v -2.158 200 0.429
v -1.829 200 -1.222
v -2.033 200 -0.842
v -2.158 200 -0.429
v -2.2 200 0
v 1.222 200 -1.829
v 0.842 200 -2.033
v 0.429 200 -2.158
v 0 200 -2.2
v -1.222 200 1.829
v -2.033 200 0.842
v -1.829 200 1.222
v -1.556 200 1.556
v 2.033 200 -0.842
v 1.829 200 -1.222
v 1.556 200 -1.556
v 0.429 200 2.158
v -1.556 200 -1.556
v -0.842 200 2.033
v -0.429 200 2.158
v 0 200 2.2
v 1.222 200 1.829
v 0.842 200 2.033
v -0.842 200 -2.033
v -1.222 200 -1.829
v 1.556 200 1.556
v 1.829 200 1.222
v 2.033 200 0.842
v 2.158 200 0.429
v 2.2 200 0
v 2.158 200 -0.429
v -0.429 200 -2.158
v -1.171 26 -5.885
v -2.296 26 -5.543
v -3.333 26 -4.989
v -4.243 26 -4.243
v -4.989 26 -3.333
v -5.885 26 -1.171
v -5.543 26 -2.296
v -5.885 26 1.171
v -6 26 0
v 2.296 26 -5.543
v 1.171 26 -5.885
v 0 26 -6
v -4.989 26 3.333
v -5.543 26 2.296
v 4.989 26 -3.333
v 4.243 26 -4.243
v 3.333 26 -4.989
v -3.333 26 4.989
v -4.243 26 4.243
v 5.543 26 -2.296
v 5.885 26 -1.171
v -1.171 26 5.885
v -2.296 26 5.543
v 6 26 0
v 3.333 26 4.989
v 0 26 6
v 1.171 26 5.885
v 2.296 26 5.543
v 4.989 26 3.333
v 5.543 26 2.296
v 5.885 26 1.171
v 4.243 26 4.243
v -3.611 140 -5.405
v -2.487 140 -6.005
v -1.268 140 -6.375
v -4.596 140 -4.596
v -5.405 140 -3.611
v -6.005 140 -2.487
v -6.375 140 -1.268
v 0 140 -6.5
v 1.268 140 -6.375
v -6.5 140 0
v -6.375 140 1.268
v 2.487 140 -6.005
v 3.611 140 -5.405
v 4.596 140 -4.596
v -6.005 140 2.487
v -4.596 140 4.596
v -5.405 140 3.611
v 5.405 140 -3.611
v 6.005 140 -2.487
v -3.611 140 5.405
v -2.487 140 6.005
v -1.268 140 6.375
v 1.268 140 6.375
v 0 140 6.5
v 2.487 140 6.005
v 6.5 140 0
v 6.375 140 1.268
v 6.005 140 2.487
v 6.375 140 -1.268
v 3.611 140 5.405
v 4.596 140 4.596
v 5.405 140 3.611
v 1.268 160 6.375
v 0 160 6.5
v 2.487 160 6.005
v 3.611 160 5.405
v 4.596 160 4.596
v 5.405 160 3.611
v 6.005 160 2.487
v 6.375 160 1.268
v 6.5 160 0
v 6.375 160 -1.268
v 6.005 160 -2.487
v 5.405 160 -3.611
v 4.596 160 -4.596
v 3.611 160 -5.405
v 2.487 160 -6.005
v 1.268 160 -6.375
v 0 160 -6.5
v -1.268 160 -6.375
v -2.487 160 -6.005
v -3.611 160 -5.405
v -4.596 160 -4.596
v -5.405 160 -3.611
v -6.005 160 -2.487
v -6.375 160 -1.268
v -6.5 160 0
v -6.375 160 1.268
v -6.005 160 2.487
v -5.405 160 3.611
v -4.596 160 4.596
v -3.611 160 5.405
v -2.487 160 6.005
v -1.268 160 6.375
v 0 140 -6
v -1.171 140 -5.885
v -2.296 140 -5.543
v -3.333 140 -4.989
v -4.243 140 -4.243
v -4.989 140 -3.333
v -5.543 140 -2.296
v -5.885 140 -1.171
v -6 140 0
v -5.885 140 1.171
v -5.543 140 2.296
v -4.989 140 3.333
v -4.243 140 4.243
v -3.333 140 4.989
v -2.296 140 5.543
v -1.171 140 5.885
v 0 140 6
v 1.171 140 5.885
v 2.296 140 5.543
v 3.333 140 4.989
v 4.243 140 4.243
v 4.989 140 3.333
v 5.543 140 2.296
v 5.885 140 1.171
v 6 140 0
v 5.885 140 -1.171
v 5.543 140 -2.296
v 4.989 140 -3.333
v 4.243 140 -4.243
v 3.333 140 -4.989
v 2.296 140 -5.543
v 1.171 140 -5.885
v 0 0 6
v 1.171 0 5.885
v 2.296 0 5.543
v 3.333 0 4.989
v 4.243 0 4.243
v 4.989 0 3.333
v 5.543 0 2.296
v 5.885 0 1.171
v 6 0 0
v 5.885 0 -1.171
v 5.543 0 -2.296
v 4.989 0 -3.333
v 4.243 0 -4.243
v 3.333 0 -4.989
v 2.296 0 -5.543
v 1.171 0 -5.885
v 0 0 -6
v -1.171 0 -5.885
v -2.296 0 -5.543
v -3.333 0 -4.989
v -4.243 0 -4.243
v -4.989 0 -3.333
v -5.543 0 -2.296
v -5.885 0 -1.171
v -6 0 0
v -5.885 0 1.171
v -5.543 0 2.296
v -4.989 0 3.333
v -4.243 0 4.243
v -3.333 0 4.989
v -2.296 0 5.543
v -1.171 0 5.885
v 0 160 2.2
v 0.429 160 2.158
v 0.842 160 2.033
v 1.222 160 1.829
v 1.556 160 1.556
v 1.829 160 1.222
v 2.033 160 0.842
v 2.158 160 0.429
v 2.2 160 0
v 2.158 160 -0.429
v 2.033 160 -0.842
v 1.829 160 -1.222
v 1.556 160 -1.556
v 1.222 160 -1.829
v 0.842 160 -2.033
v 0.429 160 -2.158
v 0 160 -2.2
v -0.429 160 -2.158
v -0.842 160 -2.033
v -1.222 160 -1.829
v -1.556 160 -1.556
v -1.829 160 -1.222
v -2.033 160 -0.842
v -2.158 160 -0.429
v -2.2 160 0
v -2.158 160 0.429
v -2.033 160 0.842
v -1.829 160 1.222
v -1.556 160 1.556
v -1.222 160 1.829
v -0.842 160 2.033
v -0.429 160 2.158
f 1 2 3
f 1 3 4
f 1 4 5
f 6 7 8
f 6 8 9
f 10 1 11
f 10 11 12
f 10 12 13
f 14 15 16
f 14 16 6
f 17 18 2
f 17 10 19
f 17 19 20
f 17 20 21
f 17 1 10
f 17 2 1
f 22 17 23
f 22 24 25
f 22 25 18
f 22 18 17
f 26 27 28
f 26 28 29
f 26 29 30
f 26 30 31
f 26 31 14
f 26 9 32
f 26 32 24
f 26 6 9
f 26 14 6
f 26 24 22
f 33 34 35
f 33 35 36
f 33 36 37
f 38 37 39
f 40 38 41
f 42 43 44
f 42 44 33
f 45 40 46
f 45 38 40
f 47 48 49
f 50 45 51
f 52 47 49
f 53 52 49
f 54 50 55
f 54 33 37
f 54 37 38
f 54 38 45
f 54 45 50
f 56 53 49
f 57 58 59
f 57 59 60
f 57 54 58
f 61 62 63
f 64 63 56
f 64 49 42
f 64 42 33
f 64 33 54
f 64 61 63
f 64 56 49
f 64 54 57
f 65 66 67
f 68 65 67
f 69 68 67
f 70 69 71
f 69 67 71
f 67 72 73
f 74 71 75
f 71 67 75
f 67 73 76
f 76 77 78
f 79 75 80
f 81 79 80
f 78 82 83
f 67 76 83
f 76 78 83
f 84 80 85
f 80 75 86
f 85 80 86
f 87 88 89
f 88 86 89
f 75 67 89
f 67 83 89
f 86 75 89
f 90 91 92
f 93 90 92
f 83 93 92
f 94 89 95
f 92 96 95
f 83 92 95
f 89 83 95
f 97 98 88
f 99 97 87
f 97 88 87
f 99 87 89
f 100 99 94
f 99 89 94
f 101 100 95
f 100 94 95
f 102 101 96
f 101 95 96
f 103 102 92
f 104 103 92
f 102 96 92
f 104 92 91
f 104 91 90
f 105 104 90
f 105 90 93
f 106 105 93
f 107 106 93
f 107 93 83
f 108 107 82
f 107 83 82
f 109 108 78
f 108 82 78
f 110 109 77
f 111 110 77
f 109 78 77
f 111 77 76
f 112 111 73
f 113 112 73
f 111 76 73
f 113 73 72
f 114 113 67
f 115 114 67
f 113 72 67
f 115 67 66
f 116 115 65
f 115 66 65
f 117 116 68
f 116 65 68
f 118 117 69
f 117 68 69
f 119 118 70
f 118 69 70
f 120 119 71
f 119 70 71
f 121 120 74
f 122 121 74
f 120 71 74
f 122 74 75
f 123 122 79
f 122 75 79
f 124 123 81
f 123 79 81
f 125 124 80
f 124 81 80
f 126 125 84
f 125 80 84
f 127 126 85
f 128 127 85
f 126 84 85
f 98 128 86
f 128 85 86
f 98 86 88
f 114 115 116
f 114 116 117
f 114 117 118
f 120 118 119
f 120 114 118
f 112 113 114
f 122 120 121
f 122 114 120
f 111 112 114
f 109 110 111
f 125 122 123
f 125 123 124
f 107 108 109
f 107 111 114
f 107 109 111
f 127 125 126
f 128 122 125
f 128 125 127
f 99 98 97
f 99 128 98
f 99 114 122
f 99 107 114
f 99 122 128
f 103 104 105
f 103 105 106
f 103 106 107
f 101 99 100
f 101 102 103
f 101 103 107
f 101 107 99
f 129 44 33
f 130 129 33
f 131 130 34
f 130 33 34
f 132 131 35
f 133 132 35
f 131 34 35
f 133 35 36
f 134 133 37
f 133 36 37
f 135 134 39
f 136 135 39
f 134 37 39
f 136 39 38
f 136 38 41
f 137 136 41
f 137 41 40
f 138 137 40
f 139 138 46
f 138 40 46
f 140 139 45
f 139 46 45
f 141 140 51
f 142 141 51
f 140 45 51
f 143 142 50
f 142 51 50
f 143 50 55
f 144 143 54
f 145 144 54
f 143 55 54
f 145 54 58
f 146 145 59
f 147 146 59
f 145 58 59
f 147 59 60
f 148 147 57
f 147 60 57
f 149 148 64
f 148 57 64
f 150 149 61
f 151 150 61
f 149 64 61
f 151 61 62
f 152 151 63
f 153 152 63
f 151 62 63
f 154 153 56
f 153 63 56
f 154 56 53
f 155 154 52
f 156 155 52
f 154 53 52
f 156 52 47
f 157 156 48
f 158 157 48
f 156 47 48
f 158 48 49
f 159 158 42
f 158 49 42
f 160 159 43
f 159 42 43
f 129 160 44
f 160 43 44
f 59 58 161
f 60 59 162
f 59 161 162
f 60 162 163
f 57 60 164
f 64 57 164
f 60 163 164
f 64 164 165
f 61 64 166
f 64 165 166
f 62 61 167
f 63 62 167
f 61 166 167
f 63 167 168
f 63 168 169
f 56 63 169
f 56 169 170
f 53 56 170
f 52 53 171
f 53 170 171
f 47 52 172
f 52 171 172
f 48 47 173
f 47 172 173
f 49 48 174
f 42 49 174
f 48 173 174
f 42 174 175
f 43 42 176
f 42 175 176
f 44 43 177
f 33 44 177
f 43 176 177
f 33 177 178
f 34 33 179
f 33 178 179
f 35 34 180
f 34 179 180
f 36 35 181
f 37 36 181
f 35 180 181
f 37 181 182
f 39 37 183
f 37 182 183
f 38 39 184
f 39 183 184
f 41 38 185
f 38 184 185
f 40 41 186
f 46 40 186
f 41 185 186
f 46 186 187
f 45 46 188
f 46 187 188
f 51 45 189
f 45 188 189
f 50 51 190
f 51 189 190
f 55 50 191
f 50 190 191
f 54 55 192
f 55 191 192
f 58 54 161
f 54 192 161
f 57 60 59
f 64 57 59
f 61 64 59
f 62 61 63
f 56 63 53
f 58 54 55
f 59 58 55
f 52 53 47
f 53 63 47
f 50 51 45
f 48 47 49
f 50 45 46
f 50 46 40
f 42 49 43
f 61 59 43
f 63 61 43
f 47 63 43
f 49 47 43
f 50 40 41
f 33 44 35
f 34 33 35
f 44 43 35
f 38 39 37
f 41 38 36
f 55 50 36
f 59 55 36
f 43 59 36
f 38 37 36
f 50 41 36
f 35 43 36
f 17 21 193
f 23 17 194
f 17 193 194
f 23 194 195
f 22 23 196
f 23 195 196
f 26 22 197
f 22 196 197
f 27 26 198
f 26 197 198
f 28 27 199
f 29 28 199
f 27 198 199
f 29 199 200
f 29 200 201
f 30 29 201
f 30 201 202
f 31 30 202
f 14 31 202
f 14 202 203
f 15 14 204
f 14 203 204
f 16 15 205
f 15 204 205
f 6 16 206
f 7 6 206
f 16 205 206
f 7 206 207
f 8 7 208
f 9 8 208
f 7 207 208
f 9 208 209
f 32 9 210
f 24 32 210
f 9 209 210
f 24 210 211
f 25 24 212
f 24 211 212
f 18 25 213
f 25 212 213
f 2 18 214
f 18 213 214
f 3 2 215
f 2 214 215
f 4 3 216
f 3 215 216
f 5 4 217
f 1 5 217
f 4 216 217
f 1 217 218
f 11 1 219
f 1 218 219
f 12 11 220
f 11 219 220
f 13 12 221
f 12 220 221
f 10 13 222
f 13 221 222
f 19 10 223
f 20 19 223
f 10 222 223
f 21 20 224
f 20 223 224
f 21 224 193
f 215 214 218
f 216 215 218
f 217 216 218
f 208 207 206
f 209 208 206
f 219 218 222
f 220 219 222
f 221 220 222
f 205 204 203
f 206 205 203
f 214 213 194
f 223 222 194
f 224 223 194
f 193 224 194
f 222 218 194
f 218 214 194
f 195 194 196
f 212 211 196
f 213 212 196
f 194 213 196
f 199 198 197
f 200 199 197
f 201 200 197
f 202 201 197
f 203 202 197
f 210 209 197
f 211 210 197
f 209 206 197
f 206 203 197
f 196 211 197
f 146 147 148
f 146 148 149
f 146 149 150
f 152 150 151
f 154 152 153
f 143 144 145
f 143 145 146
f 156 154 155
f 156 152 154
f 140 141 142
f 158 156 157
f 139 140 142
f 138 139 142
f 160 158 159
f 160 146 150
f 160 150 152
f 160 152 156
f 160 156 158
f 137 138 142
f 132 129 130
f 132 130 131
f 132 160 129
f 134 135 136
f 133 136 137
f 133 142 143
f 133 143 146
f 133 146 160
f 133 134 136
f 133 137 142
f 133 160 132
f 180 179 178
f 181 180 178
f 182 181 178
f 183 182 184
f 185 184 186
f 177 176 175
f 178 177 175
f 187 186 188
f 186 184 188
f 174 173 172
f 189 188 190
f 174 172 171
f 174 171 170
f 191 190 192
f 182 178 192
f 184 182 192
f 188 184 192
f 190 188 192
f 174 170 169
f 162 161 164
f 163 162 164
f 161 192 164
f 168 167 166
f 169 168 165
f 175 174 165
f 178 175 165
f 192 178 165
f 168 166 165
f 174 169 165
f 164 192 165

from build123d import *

# Parameters (mm, degrees)
SK_BULB_GUARD_R      = 6
BULB_GUARD_DEPTH     = 26
ELECTRODE_START      = 26
SK_ELECTRODE_BODY_R  = 6
ELECTRODE_BODY_DEPTH = 114
ELECTRODE_START_2    = 140
SK_ELECTRODE_CAP_R   = 6.5
ELECTRODE_CAP_DEPTH  = 20
CABLE_START          = 160
SK_CABLE_R           = 2.2
CABLE_DEPTH          = 40


with BuildPart() as part:
    # SK Bulb guard → Bulb guard (new body)
    with BuildSketch(Plane(origin=(0, 0, 0), x_dir=(1, 0, 0), z_dir=(0, 1, 0))):
        with Locations(Location((0, 0, 0), (0, 0, 270))):
            Circle(SK_BULB_GUARD_R)
    extrude(amount=BULB_GUARD_DEPTH)


with BuildPart() as body_2:
    # SK Electrode body → Electrode body (new body)
    with BuildSketch(Plane(origin=(0, 0, 0), x_dir=(1, 0, 0), z_dir=(0, 1, 0)).offset(ELECTRODE_START)):
        with Locations(Location((0, 0, 0), (0, 0, 90))):
            Circle(SK_ELECTRODE_BODY_R)
    extrude(amount=ELECTRODE_BODY_DEPTH)


with BuildPart() as body_3:
    # SK Electrode cap → Electrode cap (new body)
    with BuildSketch(Plane(origin=(0, 0, 0), x_dir=(1, 0, 0), z_dir=(0, 1, 0)).offset(ELECTRODE_START_2)):
        with Locations(Location((0, 0, 0), (0, 0, 270))):
            Circle(SK_ELECTRODE_CAP_R)
    extrude(amount=ELECTRODE_CAP_DEPTH)


with BuildPart() as body_4:
    # SK Cable → Cable (new body)
    with BuildSketch(Plane(origin=(0, 0, 0), x_dir=(1, 0, 0), z_dir=(0, 1, 0)).offset(CABLE_START)):
        with Locations(Location((0, 0, 0), (0, 0, 270))):
            Circle(SK_CABLE_R)
    extrude(amount=CABLE_DEPTH)


solid = Compound([part.part, body_2.part, body_3.part, body_4.part])
